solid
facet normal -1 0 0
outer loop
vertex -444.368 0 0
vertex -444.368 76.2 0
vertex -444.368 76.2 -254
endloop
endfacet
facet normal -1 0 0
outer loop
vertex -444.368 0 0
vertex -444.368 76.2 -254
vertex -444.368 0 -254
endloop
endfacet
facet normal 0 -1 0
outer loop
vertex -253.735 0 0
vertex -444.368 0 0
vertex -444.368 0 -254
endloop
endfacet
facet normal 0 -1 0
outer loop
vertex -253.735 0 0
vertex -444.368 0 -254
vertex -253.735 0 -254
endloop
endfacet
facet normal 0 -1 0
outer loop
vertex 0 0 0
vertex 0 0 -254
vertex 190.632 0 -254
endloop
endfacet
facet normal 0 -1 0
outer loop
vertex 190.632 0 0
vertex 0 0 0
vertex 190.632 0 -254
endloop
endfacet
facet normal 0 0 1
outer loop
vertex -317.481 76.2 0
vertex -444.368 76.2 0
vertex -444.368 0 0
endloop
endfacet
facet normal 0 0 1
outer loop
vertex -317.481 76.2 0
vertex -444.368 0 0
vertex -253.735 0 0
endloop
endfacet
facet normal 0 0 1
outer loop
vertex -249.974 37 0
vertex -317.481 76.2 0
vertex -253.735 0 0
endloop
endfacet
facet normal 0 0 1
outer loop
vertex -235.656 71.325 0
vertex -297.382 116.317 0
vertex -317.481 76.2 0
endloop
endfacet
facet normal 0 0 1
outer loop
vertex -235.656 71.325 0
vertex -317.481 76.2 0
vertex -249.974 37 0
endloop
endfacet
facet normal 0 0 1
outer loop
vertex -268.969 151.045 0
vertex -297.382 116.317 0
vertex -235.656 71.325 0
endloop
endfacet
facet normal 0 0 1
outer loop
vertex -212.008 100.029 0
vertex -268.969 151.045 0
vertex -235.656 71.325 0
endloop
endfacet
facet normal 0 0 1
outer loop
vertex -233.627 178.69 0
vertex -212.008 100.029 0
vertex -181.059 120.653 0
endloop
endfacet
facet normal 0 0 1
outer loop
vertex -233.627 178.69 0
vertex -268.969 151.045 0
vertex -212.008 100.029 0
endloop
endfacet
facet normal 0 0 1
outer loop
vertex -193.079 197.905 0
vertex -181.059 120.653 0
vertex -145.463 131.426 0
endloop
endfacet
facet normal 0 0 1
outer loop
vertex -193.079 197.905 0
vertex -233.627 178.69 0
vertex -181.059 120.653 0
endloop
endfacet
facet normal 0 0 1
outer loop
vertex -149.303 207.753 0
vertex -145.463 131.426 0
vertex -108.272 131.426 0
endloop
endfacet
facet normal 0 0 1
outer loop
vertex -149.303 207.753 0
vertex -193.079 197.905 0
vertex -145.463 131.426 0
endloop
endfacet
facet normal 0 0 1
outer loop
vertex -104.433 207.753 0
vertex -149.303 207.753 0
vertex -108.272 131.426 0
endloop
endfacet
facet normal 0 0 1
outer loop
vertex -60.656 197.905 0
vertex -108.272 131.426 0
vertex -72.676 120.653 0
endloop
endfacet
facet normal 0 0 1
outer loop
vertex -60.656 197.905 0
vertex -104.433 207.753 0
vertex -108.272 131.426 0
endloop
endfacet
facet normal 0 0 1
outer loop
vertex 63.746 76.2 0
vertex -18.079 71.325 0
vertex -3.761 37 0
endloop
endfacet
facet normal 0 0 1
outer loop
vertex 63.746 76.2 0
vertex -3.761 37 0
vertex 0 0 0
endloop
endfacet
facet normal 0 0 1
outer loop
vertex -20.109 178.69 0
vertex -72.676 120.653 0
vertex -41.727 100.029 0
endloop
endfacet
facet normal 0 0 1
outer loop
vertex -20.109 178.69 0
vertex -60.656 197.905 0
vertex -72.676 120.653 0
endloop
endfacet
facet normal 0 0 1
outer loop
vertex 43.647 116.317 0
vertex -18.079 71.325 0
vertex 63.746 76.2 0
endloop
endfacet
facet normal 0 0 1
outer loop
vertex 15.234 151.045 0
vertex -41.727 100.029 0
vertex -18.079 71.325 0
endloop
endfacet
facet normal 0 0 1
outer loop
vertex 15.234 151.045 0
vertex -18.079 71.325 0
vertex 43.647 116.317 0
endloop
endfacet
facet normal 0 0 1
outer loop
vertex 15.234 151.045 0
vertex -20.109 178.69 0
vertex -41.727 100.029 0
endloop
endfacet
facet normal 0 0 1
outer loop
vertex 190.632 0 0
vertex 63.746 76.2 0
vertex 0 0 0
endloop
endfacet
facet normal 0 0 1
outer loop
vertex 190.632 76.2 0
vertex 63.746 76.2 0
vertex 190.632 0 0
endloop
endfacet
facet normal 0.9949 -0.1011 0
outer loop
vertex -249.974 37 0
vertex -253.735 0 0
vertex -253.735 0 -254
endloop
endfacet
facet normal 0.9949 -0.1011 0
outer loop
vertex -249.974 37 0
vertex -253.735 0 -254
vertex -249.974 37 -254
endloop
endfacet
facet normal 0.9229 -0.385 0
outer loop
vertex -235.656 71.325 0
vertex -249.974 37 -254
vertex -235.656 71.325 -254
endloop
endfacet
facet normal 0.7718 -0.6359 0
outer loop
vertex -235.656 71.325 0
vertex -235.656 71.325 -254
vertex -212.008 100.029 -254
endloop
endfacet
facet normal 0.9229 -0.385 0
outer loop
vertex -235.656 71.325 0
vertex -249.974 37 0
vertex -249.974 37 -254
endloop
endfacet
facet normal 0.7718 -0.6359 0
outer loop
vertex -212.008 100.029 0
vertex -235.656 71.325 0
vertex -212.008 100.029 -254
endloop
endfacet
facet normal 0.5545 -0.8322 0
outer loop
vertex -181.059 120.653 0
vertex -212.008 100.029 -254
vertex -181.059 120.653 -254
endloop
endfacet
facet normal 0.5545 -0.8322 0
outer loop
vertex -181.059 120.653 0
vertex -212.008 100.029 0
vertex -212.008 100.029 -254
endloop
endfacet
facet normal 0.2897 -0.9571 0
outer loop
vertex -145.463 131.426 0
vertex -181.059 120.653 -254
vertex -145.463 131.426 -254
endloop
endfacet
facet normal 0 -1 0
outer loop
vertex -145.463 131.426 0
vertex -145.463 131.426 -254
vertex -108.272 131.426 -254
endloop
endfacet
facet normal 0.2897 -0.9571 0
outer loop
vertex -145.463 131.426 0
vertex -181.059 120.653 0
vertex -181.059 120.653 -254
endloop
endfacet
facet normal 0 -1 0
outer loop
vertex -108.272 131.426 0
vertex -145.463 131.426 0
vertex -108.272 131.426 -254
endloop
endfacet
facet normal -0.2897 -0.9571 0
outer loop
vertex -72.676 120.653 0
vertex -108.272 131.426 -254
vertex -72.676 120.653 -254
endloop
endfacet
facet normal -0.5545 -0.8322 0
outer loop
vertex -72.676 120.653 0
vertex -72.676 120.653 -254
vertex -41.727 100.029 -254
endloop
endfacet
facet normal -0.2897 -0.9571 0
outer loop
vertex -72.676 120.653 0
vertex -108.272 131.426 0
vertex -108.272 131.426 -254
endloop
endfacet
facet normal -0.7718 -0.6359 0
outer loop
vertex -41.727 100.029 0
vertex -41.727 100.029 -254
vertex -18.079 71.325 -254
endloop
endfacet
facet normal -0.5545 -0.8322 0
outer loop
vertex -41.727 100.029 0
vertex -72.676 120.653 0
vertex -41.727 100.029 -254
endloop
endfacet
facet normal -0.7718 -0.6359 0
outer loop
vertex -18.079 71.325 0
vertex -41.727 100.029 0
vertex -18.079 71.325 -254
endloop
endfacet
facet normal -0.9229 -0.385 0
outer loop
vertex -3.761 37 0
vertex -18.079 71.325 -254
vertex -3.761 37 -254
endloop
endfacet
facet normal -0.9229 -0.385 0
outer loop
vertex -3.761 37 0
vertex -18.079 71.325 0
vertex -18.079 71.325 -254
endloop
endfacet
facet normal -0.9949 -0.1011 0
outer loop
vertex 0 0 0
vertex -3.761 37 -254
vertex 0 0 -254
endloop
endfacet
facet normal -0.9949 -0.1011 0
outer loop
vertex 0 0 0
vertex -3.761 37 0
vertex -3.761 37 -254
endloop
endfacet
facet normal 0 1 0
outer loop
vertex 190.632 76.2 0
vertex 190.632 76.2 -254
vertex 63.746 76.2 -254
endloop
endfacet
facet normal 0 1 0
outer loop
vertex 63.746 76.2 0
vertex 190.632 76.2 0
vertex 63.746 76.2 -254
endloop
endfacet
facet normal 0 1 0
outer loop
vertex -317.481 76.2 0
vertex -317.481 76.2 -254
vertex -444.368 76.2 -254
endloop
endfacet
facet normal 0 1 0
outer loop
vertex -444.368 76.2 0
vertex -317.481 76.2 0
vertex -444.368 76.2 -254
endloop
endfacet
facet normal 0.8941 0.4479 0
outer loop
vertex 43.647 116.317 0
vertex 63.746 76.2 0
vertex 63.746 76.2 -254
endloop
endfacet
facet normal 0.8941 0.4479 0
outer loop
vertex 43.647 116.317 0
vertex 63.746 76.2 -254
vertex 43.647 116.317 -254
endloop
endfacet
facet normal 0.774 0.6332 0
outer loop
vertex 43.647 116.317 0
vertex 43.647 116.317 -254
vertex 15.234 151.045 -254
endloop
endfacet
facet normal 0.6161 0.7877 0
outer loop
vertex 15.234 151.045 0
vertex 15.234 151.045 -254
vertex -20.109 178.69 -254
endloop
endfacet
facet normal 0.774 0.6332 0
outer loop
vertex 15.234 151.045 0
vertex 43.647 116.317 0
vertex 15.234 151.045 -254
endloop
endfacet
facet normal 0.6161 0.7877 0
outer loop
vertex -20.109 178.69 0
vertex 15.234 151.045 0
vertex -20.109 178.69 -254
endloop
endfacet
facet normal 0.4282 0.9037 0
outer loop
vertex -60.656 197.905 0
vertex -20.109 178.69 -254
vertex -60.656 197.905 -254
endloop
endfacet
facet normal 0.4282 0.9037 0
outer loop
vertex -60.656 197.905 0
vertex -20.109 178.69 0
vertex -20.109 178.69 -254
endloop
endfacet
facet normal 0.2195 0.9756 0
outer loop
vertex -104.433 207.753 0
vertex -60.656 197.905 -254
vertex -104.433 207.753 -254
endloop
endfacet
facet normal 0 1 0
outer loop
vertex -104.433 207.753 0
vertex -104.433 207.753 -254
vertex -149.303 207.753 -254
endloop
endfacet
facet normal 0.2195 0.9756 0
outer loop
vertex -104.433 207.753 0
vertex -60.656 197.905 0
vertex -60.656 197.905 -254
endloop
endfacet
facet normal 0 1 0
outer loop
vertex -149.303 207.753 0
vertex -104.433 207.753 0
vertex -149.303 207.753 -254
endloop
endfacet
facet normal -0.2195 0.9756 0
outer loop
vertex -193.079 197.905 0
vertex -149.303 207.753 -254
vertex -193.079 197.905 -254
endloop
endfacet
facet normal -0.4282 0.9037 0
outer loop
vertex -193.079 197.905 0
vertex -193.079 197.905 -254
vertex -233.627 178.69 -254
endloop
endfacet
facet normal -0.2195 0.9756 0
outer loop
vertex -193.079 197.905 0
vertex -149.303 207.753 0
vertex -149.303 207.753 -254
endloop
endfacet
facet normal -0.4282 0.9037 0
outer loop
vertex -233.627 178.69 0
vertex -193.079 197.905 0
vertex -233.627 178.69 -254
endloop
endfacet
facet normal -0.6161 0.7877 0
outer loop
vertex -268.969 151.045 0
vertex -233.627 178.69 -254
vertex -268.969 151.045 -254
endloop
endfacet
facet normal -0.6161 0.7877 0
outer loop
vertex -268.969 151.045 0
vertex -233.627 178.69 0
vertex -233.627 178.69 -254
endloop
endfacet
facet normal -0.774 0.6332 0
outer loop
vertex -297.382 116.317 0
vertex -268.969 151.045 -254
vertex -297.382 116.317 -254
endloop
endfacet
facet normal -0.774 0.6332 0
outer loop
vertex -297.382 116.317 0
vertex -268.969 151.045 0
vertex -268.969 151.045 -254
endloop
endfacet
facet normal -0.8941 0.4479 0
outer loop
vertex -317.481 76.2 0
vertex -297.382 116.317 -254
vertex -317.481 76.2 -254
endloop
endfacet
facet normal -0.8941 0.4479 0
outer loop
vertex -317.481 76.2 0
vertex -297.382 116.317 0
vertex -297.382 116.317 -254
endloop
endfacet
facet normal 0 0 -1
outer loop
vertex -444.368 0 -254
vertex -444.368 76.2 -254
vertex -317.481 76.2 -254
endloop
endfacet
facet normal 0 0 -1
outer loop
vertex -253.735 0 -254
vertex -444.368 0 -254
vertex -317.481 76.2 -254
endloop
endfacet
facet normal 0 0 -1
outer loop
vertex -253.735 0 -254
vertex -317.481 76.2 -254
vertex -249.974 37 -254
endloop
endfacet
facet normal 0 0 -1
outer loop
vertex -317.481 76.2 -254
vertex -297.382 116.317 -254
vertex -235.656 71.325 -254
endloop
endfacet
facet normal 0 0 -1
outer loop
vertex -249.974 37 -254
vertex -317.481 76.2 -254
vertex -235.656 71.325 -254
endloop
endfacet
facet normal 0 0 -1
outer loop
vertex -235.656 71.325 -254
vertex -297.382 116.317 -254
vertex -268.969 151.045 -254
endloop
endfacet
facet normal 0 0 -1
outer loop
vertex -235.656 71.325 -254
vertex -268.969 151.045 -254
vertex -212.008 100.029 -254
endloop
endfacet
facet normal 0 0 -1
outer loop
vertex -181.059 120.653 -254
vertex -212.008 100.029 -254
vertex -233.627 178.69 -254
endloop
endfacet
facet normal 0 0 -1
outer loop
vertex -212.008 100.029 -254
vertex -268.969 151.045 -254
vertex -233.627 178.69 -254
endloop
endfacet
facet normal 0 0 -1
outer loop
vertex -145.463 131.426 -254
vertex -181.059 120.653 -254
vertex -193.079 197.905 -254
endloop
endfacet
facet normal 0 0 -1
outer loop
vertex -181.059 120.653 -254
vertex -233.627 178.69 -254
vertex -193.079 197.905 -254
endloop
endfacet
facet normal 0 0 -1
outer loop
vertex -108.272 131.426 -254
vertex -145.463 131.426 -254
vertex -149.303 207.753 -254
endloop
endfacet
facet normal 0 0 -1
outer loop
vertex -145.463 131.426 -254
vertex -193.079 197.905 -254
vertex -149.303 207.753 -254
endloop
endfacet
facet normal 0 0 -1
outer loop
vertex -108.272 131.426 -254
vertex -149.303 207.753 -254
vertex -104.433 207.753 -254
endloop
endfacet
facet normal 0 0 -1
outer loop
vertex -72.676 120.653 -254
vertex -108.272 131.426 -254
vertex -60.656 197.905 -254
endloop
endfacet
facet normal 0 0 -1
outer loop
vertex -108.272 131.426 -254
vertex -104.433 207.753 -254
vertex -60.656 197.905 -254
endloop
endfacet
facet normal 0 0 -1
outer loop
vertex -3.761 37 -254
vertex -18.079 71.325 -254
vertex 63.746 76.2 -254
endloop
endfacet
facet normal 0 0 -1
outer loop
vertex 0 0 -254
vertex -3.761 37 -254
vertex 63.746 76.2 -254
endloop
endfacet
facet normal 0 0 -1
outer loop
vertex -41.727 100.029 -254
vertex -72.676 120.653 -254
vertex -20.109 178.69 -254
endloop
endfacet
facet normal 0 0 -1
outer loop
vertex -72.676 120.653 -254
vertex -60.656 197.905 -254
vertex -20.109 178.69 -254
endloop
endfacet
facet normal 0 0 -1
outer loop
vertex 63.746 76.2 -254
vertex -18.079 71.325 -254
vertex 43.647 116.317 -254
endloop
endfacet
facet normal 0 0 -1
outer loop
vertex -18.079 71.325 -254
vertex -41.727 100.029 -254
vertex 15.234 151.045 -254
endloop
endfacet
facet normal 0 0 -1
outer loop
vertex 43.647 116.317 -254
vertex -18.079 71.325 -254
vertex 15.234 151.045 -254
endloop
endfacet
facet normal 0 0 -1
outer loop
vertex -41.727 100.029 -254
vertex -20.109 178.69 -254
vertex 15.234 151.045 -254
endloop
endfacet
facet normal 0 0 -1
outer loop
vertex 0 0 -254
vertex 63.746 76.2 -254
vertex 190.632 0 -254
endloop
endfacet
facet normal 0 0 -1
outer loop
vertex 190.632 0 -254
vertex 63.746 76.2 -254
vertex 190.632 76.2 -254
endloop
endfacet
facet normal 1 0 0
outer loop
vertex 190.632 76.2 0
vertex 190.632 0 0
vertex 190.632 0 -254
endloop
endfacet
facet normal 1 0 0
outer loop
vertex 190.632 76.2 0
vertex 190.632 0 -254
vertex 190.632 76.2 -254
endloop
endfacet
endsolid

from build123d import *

# Parameters (mm, degrees)
BOSS_EXTRUDE1_DEPTH = 254


with BuildPart() as part:
    # Sketch1 → Boss-Extrude1 (new body)
    with BuildSketch(Plane.XY):
        with BuildLine():
            Line((0, 0), (190.632291842, 0))
            Line((190.632291842, 0), (190.632291842, 76.2))
            Line((190.632291842, 76.2), (63.745532682, 76.2))
            ThreePointArc((63.745532682, 76.2), (-126.867708158, 208.995224478), (-317.480948998, 76.2))
            Line((-317.480948998, 76.2), (-444.367708158, 76.2))
            Line((-444.367708158, 76.2), (-444.367708158, 0))
            Line((-444.367708158, 0), (-253.735416316, 0))
            ThreePointArc((-253.735416316, 0), (-126.867708158, 132.795224478), (0, 0))
        make_face()
    extrude(amount=-BOSS_EXTRUDE1_DEPTH)


solid = part.part
